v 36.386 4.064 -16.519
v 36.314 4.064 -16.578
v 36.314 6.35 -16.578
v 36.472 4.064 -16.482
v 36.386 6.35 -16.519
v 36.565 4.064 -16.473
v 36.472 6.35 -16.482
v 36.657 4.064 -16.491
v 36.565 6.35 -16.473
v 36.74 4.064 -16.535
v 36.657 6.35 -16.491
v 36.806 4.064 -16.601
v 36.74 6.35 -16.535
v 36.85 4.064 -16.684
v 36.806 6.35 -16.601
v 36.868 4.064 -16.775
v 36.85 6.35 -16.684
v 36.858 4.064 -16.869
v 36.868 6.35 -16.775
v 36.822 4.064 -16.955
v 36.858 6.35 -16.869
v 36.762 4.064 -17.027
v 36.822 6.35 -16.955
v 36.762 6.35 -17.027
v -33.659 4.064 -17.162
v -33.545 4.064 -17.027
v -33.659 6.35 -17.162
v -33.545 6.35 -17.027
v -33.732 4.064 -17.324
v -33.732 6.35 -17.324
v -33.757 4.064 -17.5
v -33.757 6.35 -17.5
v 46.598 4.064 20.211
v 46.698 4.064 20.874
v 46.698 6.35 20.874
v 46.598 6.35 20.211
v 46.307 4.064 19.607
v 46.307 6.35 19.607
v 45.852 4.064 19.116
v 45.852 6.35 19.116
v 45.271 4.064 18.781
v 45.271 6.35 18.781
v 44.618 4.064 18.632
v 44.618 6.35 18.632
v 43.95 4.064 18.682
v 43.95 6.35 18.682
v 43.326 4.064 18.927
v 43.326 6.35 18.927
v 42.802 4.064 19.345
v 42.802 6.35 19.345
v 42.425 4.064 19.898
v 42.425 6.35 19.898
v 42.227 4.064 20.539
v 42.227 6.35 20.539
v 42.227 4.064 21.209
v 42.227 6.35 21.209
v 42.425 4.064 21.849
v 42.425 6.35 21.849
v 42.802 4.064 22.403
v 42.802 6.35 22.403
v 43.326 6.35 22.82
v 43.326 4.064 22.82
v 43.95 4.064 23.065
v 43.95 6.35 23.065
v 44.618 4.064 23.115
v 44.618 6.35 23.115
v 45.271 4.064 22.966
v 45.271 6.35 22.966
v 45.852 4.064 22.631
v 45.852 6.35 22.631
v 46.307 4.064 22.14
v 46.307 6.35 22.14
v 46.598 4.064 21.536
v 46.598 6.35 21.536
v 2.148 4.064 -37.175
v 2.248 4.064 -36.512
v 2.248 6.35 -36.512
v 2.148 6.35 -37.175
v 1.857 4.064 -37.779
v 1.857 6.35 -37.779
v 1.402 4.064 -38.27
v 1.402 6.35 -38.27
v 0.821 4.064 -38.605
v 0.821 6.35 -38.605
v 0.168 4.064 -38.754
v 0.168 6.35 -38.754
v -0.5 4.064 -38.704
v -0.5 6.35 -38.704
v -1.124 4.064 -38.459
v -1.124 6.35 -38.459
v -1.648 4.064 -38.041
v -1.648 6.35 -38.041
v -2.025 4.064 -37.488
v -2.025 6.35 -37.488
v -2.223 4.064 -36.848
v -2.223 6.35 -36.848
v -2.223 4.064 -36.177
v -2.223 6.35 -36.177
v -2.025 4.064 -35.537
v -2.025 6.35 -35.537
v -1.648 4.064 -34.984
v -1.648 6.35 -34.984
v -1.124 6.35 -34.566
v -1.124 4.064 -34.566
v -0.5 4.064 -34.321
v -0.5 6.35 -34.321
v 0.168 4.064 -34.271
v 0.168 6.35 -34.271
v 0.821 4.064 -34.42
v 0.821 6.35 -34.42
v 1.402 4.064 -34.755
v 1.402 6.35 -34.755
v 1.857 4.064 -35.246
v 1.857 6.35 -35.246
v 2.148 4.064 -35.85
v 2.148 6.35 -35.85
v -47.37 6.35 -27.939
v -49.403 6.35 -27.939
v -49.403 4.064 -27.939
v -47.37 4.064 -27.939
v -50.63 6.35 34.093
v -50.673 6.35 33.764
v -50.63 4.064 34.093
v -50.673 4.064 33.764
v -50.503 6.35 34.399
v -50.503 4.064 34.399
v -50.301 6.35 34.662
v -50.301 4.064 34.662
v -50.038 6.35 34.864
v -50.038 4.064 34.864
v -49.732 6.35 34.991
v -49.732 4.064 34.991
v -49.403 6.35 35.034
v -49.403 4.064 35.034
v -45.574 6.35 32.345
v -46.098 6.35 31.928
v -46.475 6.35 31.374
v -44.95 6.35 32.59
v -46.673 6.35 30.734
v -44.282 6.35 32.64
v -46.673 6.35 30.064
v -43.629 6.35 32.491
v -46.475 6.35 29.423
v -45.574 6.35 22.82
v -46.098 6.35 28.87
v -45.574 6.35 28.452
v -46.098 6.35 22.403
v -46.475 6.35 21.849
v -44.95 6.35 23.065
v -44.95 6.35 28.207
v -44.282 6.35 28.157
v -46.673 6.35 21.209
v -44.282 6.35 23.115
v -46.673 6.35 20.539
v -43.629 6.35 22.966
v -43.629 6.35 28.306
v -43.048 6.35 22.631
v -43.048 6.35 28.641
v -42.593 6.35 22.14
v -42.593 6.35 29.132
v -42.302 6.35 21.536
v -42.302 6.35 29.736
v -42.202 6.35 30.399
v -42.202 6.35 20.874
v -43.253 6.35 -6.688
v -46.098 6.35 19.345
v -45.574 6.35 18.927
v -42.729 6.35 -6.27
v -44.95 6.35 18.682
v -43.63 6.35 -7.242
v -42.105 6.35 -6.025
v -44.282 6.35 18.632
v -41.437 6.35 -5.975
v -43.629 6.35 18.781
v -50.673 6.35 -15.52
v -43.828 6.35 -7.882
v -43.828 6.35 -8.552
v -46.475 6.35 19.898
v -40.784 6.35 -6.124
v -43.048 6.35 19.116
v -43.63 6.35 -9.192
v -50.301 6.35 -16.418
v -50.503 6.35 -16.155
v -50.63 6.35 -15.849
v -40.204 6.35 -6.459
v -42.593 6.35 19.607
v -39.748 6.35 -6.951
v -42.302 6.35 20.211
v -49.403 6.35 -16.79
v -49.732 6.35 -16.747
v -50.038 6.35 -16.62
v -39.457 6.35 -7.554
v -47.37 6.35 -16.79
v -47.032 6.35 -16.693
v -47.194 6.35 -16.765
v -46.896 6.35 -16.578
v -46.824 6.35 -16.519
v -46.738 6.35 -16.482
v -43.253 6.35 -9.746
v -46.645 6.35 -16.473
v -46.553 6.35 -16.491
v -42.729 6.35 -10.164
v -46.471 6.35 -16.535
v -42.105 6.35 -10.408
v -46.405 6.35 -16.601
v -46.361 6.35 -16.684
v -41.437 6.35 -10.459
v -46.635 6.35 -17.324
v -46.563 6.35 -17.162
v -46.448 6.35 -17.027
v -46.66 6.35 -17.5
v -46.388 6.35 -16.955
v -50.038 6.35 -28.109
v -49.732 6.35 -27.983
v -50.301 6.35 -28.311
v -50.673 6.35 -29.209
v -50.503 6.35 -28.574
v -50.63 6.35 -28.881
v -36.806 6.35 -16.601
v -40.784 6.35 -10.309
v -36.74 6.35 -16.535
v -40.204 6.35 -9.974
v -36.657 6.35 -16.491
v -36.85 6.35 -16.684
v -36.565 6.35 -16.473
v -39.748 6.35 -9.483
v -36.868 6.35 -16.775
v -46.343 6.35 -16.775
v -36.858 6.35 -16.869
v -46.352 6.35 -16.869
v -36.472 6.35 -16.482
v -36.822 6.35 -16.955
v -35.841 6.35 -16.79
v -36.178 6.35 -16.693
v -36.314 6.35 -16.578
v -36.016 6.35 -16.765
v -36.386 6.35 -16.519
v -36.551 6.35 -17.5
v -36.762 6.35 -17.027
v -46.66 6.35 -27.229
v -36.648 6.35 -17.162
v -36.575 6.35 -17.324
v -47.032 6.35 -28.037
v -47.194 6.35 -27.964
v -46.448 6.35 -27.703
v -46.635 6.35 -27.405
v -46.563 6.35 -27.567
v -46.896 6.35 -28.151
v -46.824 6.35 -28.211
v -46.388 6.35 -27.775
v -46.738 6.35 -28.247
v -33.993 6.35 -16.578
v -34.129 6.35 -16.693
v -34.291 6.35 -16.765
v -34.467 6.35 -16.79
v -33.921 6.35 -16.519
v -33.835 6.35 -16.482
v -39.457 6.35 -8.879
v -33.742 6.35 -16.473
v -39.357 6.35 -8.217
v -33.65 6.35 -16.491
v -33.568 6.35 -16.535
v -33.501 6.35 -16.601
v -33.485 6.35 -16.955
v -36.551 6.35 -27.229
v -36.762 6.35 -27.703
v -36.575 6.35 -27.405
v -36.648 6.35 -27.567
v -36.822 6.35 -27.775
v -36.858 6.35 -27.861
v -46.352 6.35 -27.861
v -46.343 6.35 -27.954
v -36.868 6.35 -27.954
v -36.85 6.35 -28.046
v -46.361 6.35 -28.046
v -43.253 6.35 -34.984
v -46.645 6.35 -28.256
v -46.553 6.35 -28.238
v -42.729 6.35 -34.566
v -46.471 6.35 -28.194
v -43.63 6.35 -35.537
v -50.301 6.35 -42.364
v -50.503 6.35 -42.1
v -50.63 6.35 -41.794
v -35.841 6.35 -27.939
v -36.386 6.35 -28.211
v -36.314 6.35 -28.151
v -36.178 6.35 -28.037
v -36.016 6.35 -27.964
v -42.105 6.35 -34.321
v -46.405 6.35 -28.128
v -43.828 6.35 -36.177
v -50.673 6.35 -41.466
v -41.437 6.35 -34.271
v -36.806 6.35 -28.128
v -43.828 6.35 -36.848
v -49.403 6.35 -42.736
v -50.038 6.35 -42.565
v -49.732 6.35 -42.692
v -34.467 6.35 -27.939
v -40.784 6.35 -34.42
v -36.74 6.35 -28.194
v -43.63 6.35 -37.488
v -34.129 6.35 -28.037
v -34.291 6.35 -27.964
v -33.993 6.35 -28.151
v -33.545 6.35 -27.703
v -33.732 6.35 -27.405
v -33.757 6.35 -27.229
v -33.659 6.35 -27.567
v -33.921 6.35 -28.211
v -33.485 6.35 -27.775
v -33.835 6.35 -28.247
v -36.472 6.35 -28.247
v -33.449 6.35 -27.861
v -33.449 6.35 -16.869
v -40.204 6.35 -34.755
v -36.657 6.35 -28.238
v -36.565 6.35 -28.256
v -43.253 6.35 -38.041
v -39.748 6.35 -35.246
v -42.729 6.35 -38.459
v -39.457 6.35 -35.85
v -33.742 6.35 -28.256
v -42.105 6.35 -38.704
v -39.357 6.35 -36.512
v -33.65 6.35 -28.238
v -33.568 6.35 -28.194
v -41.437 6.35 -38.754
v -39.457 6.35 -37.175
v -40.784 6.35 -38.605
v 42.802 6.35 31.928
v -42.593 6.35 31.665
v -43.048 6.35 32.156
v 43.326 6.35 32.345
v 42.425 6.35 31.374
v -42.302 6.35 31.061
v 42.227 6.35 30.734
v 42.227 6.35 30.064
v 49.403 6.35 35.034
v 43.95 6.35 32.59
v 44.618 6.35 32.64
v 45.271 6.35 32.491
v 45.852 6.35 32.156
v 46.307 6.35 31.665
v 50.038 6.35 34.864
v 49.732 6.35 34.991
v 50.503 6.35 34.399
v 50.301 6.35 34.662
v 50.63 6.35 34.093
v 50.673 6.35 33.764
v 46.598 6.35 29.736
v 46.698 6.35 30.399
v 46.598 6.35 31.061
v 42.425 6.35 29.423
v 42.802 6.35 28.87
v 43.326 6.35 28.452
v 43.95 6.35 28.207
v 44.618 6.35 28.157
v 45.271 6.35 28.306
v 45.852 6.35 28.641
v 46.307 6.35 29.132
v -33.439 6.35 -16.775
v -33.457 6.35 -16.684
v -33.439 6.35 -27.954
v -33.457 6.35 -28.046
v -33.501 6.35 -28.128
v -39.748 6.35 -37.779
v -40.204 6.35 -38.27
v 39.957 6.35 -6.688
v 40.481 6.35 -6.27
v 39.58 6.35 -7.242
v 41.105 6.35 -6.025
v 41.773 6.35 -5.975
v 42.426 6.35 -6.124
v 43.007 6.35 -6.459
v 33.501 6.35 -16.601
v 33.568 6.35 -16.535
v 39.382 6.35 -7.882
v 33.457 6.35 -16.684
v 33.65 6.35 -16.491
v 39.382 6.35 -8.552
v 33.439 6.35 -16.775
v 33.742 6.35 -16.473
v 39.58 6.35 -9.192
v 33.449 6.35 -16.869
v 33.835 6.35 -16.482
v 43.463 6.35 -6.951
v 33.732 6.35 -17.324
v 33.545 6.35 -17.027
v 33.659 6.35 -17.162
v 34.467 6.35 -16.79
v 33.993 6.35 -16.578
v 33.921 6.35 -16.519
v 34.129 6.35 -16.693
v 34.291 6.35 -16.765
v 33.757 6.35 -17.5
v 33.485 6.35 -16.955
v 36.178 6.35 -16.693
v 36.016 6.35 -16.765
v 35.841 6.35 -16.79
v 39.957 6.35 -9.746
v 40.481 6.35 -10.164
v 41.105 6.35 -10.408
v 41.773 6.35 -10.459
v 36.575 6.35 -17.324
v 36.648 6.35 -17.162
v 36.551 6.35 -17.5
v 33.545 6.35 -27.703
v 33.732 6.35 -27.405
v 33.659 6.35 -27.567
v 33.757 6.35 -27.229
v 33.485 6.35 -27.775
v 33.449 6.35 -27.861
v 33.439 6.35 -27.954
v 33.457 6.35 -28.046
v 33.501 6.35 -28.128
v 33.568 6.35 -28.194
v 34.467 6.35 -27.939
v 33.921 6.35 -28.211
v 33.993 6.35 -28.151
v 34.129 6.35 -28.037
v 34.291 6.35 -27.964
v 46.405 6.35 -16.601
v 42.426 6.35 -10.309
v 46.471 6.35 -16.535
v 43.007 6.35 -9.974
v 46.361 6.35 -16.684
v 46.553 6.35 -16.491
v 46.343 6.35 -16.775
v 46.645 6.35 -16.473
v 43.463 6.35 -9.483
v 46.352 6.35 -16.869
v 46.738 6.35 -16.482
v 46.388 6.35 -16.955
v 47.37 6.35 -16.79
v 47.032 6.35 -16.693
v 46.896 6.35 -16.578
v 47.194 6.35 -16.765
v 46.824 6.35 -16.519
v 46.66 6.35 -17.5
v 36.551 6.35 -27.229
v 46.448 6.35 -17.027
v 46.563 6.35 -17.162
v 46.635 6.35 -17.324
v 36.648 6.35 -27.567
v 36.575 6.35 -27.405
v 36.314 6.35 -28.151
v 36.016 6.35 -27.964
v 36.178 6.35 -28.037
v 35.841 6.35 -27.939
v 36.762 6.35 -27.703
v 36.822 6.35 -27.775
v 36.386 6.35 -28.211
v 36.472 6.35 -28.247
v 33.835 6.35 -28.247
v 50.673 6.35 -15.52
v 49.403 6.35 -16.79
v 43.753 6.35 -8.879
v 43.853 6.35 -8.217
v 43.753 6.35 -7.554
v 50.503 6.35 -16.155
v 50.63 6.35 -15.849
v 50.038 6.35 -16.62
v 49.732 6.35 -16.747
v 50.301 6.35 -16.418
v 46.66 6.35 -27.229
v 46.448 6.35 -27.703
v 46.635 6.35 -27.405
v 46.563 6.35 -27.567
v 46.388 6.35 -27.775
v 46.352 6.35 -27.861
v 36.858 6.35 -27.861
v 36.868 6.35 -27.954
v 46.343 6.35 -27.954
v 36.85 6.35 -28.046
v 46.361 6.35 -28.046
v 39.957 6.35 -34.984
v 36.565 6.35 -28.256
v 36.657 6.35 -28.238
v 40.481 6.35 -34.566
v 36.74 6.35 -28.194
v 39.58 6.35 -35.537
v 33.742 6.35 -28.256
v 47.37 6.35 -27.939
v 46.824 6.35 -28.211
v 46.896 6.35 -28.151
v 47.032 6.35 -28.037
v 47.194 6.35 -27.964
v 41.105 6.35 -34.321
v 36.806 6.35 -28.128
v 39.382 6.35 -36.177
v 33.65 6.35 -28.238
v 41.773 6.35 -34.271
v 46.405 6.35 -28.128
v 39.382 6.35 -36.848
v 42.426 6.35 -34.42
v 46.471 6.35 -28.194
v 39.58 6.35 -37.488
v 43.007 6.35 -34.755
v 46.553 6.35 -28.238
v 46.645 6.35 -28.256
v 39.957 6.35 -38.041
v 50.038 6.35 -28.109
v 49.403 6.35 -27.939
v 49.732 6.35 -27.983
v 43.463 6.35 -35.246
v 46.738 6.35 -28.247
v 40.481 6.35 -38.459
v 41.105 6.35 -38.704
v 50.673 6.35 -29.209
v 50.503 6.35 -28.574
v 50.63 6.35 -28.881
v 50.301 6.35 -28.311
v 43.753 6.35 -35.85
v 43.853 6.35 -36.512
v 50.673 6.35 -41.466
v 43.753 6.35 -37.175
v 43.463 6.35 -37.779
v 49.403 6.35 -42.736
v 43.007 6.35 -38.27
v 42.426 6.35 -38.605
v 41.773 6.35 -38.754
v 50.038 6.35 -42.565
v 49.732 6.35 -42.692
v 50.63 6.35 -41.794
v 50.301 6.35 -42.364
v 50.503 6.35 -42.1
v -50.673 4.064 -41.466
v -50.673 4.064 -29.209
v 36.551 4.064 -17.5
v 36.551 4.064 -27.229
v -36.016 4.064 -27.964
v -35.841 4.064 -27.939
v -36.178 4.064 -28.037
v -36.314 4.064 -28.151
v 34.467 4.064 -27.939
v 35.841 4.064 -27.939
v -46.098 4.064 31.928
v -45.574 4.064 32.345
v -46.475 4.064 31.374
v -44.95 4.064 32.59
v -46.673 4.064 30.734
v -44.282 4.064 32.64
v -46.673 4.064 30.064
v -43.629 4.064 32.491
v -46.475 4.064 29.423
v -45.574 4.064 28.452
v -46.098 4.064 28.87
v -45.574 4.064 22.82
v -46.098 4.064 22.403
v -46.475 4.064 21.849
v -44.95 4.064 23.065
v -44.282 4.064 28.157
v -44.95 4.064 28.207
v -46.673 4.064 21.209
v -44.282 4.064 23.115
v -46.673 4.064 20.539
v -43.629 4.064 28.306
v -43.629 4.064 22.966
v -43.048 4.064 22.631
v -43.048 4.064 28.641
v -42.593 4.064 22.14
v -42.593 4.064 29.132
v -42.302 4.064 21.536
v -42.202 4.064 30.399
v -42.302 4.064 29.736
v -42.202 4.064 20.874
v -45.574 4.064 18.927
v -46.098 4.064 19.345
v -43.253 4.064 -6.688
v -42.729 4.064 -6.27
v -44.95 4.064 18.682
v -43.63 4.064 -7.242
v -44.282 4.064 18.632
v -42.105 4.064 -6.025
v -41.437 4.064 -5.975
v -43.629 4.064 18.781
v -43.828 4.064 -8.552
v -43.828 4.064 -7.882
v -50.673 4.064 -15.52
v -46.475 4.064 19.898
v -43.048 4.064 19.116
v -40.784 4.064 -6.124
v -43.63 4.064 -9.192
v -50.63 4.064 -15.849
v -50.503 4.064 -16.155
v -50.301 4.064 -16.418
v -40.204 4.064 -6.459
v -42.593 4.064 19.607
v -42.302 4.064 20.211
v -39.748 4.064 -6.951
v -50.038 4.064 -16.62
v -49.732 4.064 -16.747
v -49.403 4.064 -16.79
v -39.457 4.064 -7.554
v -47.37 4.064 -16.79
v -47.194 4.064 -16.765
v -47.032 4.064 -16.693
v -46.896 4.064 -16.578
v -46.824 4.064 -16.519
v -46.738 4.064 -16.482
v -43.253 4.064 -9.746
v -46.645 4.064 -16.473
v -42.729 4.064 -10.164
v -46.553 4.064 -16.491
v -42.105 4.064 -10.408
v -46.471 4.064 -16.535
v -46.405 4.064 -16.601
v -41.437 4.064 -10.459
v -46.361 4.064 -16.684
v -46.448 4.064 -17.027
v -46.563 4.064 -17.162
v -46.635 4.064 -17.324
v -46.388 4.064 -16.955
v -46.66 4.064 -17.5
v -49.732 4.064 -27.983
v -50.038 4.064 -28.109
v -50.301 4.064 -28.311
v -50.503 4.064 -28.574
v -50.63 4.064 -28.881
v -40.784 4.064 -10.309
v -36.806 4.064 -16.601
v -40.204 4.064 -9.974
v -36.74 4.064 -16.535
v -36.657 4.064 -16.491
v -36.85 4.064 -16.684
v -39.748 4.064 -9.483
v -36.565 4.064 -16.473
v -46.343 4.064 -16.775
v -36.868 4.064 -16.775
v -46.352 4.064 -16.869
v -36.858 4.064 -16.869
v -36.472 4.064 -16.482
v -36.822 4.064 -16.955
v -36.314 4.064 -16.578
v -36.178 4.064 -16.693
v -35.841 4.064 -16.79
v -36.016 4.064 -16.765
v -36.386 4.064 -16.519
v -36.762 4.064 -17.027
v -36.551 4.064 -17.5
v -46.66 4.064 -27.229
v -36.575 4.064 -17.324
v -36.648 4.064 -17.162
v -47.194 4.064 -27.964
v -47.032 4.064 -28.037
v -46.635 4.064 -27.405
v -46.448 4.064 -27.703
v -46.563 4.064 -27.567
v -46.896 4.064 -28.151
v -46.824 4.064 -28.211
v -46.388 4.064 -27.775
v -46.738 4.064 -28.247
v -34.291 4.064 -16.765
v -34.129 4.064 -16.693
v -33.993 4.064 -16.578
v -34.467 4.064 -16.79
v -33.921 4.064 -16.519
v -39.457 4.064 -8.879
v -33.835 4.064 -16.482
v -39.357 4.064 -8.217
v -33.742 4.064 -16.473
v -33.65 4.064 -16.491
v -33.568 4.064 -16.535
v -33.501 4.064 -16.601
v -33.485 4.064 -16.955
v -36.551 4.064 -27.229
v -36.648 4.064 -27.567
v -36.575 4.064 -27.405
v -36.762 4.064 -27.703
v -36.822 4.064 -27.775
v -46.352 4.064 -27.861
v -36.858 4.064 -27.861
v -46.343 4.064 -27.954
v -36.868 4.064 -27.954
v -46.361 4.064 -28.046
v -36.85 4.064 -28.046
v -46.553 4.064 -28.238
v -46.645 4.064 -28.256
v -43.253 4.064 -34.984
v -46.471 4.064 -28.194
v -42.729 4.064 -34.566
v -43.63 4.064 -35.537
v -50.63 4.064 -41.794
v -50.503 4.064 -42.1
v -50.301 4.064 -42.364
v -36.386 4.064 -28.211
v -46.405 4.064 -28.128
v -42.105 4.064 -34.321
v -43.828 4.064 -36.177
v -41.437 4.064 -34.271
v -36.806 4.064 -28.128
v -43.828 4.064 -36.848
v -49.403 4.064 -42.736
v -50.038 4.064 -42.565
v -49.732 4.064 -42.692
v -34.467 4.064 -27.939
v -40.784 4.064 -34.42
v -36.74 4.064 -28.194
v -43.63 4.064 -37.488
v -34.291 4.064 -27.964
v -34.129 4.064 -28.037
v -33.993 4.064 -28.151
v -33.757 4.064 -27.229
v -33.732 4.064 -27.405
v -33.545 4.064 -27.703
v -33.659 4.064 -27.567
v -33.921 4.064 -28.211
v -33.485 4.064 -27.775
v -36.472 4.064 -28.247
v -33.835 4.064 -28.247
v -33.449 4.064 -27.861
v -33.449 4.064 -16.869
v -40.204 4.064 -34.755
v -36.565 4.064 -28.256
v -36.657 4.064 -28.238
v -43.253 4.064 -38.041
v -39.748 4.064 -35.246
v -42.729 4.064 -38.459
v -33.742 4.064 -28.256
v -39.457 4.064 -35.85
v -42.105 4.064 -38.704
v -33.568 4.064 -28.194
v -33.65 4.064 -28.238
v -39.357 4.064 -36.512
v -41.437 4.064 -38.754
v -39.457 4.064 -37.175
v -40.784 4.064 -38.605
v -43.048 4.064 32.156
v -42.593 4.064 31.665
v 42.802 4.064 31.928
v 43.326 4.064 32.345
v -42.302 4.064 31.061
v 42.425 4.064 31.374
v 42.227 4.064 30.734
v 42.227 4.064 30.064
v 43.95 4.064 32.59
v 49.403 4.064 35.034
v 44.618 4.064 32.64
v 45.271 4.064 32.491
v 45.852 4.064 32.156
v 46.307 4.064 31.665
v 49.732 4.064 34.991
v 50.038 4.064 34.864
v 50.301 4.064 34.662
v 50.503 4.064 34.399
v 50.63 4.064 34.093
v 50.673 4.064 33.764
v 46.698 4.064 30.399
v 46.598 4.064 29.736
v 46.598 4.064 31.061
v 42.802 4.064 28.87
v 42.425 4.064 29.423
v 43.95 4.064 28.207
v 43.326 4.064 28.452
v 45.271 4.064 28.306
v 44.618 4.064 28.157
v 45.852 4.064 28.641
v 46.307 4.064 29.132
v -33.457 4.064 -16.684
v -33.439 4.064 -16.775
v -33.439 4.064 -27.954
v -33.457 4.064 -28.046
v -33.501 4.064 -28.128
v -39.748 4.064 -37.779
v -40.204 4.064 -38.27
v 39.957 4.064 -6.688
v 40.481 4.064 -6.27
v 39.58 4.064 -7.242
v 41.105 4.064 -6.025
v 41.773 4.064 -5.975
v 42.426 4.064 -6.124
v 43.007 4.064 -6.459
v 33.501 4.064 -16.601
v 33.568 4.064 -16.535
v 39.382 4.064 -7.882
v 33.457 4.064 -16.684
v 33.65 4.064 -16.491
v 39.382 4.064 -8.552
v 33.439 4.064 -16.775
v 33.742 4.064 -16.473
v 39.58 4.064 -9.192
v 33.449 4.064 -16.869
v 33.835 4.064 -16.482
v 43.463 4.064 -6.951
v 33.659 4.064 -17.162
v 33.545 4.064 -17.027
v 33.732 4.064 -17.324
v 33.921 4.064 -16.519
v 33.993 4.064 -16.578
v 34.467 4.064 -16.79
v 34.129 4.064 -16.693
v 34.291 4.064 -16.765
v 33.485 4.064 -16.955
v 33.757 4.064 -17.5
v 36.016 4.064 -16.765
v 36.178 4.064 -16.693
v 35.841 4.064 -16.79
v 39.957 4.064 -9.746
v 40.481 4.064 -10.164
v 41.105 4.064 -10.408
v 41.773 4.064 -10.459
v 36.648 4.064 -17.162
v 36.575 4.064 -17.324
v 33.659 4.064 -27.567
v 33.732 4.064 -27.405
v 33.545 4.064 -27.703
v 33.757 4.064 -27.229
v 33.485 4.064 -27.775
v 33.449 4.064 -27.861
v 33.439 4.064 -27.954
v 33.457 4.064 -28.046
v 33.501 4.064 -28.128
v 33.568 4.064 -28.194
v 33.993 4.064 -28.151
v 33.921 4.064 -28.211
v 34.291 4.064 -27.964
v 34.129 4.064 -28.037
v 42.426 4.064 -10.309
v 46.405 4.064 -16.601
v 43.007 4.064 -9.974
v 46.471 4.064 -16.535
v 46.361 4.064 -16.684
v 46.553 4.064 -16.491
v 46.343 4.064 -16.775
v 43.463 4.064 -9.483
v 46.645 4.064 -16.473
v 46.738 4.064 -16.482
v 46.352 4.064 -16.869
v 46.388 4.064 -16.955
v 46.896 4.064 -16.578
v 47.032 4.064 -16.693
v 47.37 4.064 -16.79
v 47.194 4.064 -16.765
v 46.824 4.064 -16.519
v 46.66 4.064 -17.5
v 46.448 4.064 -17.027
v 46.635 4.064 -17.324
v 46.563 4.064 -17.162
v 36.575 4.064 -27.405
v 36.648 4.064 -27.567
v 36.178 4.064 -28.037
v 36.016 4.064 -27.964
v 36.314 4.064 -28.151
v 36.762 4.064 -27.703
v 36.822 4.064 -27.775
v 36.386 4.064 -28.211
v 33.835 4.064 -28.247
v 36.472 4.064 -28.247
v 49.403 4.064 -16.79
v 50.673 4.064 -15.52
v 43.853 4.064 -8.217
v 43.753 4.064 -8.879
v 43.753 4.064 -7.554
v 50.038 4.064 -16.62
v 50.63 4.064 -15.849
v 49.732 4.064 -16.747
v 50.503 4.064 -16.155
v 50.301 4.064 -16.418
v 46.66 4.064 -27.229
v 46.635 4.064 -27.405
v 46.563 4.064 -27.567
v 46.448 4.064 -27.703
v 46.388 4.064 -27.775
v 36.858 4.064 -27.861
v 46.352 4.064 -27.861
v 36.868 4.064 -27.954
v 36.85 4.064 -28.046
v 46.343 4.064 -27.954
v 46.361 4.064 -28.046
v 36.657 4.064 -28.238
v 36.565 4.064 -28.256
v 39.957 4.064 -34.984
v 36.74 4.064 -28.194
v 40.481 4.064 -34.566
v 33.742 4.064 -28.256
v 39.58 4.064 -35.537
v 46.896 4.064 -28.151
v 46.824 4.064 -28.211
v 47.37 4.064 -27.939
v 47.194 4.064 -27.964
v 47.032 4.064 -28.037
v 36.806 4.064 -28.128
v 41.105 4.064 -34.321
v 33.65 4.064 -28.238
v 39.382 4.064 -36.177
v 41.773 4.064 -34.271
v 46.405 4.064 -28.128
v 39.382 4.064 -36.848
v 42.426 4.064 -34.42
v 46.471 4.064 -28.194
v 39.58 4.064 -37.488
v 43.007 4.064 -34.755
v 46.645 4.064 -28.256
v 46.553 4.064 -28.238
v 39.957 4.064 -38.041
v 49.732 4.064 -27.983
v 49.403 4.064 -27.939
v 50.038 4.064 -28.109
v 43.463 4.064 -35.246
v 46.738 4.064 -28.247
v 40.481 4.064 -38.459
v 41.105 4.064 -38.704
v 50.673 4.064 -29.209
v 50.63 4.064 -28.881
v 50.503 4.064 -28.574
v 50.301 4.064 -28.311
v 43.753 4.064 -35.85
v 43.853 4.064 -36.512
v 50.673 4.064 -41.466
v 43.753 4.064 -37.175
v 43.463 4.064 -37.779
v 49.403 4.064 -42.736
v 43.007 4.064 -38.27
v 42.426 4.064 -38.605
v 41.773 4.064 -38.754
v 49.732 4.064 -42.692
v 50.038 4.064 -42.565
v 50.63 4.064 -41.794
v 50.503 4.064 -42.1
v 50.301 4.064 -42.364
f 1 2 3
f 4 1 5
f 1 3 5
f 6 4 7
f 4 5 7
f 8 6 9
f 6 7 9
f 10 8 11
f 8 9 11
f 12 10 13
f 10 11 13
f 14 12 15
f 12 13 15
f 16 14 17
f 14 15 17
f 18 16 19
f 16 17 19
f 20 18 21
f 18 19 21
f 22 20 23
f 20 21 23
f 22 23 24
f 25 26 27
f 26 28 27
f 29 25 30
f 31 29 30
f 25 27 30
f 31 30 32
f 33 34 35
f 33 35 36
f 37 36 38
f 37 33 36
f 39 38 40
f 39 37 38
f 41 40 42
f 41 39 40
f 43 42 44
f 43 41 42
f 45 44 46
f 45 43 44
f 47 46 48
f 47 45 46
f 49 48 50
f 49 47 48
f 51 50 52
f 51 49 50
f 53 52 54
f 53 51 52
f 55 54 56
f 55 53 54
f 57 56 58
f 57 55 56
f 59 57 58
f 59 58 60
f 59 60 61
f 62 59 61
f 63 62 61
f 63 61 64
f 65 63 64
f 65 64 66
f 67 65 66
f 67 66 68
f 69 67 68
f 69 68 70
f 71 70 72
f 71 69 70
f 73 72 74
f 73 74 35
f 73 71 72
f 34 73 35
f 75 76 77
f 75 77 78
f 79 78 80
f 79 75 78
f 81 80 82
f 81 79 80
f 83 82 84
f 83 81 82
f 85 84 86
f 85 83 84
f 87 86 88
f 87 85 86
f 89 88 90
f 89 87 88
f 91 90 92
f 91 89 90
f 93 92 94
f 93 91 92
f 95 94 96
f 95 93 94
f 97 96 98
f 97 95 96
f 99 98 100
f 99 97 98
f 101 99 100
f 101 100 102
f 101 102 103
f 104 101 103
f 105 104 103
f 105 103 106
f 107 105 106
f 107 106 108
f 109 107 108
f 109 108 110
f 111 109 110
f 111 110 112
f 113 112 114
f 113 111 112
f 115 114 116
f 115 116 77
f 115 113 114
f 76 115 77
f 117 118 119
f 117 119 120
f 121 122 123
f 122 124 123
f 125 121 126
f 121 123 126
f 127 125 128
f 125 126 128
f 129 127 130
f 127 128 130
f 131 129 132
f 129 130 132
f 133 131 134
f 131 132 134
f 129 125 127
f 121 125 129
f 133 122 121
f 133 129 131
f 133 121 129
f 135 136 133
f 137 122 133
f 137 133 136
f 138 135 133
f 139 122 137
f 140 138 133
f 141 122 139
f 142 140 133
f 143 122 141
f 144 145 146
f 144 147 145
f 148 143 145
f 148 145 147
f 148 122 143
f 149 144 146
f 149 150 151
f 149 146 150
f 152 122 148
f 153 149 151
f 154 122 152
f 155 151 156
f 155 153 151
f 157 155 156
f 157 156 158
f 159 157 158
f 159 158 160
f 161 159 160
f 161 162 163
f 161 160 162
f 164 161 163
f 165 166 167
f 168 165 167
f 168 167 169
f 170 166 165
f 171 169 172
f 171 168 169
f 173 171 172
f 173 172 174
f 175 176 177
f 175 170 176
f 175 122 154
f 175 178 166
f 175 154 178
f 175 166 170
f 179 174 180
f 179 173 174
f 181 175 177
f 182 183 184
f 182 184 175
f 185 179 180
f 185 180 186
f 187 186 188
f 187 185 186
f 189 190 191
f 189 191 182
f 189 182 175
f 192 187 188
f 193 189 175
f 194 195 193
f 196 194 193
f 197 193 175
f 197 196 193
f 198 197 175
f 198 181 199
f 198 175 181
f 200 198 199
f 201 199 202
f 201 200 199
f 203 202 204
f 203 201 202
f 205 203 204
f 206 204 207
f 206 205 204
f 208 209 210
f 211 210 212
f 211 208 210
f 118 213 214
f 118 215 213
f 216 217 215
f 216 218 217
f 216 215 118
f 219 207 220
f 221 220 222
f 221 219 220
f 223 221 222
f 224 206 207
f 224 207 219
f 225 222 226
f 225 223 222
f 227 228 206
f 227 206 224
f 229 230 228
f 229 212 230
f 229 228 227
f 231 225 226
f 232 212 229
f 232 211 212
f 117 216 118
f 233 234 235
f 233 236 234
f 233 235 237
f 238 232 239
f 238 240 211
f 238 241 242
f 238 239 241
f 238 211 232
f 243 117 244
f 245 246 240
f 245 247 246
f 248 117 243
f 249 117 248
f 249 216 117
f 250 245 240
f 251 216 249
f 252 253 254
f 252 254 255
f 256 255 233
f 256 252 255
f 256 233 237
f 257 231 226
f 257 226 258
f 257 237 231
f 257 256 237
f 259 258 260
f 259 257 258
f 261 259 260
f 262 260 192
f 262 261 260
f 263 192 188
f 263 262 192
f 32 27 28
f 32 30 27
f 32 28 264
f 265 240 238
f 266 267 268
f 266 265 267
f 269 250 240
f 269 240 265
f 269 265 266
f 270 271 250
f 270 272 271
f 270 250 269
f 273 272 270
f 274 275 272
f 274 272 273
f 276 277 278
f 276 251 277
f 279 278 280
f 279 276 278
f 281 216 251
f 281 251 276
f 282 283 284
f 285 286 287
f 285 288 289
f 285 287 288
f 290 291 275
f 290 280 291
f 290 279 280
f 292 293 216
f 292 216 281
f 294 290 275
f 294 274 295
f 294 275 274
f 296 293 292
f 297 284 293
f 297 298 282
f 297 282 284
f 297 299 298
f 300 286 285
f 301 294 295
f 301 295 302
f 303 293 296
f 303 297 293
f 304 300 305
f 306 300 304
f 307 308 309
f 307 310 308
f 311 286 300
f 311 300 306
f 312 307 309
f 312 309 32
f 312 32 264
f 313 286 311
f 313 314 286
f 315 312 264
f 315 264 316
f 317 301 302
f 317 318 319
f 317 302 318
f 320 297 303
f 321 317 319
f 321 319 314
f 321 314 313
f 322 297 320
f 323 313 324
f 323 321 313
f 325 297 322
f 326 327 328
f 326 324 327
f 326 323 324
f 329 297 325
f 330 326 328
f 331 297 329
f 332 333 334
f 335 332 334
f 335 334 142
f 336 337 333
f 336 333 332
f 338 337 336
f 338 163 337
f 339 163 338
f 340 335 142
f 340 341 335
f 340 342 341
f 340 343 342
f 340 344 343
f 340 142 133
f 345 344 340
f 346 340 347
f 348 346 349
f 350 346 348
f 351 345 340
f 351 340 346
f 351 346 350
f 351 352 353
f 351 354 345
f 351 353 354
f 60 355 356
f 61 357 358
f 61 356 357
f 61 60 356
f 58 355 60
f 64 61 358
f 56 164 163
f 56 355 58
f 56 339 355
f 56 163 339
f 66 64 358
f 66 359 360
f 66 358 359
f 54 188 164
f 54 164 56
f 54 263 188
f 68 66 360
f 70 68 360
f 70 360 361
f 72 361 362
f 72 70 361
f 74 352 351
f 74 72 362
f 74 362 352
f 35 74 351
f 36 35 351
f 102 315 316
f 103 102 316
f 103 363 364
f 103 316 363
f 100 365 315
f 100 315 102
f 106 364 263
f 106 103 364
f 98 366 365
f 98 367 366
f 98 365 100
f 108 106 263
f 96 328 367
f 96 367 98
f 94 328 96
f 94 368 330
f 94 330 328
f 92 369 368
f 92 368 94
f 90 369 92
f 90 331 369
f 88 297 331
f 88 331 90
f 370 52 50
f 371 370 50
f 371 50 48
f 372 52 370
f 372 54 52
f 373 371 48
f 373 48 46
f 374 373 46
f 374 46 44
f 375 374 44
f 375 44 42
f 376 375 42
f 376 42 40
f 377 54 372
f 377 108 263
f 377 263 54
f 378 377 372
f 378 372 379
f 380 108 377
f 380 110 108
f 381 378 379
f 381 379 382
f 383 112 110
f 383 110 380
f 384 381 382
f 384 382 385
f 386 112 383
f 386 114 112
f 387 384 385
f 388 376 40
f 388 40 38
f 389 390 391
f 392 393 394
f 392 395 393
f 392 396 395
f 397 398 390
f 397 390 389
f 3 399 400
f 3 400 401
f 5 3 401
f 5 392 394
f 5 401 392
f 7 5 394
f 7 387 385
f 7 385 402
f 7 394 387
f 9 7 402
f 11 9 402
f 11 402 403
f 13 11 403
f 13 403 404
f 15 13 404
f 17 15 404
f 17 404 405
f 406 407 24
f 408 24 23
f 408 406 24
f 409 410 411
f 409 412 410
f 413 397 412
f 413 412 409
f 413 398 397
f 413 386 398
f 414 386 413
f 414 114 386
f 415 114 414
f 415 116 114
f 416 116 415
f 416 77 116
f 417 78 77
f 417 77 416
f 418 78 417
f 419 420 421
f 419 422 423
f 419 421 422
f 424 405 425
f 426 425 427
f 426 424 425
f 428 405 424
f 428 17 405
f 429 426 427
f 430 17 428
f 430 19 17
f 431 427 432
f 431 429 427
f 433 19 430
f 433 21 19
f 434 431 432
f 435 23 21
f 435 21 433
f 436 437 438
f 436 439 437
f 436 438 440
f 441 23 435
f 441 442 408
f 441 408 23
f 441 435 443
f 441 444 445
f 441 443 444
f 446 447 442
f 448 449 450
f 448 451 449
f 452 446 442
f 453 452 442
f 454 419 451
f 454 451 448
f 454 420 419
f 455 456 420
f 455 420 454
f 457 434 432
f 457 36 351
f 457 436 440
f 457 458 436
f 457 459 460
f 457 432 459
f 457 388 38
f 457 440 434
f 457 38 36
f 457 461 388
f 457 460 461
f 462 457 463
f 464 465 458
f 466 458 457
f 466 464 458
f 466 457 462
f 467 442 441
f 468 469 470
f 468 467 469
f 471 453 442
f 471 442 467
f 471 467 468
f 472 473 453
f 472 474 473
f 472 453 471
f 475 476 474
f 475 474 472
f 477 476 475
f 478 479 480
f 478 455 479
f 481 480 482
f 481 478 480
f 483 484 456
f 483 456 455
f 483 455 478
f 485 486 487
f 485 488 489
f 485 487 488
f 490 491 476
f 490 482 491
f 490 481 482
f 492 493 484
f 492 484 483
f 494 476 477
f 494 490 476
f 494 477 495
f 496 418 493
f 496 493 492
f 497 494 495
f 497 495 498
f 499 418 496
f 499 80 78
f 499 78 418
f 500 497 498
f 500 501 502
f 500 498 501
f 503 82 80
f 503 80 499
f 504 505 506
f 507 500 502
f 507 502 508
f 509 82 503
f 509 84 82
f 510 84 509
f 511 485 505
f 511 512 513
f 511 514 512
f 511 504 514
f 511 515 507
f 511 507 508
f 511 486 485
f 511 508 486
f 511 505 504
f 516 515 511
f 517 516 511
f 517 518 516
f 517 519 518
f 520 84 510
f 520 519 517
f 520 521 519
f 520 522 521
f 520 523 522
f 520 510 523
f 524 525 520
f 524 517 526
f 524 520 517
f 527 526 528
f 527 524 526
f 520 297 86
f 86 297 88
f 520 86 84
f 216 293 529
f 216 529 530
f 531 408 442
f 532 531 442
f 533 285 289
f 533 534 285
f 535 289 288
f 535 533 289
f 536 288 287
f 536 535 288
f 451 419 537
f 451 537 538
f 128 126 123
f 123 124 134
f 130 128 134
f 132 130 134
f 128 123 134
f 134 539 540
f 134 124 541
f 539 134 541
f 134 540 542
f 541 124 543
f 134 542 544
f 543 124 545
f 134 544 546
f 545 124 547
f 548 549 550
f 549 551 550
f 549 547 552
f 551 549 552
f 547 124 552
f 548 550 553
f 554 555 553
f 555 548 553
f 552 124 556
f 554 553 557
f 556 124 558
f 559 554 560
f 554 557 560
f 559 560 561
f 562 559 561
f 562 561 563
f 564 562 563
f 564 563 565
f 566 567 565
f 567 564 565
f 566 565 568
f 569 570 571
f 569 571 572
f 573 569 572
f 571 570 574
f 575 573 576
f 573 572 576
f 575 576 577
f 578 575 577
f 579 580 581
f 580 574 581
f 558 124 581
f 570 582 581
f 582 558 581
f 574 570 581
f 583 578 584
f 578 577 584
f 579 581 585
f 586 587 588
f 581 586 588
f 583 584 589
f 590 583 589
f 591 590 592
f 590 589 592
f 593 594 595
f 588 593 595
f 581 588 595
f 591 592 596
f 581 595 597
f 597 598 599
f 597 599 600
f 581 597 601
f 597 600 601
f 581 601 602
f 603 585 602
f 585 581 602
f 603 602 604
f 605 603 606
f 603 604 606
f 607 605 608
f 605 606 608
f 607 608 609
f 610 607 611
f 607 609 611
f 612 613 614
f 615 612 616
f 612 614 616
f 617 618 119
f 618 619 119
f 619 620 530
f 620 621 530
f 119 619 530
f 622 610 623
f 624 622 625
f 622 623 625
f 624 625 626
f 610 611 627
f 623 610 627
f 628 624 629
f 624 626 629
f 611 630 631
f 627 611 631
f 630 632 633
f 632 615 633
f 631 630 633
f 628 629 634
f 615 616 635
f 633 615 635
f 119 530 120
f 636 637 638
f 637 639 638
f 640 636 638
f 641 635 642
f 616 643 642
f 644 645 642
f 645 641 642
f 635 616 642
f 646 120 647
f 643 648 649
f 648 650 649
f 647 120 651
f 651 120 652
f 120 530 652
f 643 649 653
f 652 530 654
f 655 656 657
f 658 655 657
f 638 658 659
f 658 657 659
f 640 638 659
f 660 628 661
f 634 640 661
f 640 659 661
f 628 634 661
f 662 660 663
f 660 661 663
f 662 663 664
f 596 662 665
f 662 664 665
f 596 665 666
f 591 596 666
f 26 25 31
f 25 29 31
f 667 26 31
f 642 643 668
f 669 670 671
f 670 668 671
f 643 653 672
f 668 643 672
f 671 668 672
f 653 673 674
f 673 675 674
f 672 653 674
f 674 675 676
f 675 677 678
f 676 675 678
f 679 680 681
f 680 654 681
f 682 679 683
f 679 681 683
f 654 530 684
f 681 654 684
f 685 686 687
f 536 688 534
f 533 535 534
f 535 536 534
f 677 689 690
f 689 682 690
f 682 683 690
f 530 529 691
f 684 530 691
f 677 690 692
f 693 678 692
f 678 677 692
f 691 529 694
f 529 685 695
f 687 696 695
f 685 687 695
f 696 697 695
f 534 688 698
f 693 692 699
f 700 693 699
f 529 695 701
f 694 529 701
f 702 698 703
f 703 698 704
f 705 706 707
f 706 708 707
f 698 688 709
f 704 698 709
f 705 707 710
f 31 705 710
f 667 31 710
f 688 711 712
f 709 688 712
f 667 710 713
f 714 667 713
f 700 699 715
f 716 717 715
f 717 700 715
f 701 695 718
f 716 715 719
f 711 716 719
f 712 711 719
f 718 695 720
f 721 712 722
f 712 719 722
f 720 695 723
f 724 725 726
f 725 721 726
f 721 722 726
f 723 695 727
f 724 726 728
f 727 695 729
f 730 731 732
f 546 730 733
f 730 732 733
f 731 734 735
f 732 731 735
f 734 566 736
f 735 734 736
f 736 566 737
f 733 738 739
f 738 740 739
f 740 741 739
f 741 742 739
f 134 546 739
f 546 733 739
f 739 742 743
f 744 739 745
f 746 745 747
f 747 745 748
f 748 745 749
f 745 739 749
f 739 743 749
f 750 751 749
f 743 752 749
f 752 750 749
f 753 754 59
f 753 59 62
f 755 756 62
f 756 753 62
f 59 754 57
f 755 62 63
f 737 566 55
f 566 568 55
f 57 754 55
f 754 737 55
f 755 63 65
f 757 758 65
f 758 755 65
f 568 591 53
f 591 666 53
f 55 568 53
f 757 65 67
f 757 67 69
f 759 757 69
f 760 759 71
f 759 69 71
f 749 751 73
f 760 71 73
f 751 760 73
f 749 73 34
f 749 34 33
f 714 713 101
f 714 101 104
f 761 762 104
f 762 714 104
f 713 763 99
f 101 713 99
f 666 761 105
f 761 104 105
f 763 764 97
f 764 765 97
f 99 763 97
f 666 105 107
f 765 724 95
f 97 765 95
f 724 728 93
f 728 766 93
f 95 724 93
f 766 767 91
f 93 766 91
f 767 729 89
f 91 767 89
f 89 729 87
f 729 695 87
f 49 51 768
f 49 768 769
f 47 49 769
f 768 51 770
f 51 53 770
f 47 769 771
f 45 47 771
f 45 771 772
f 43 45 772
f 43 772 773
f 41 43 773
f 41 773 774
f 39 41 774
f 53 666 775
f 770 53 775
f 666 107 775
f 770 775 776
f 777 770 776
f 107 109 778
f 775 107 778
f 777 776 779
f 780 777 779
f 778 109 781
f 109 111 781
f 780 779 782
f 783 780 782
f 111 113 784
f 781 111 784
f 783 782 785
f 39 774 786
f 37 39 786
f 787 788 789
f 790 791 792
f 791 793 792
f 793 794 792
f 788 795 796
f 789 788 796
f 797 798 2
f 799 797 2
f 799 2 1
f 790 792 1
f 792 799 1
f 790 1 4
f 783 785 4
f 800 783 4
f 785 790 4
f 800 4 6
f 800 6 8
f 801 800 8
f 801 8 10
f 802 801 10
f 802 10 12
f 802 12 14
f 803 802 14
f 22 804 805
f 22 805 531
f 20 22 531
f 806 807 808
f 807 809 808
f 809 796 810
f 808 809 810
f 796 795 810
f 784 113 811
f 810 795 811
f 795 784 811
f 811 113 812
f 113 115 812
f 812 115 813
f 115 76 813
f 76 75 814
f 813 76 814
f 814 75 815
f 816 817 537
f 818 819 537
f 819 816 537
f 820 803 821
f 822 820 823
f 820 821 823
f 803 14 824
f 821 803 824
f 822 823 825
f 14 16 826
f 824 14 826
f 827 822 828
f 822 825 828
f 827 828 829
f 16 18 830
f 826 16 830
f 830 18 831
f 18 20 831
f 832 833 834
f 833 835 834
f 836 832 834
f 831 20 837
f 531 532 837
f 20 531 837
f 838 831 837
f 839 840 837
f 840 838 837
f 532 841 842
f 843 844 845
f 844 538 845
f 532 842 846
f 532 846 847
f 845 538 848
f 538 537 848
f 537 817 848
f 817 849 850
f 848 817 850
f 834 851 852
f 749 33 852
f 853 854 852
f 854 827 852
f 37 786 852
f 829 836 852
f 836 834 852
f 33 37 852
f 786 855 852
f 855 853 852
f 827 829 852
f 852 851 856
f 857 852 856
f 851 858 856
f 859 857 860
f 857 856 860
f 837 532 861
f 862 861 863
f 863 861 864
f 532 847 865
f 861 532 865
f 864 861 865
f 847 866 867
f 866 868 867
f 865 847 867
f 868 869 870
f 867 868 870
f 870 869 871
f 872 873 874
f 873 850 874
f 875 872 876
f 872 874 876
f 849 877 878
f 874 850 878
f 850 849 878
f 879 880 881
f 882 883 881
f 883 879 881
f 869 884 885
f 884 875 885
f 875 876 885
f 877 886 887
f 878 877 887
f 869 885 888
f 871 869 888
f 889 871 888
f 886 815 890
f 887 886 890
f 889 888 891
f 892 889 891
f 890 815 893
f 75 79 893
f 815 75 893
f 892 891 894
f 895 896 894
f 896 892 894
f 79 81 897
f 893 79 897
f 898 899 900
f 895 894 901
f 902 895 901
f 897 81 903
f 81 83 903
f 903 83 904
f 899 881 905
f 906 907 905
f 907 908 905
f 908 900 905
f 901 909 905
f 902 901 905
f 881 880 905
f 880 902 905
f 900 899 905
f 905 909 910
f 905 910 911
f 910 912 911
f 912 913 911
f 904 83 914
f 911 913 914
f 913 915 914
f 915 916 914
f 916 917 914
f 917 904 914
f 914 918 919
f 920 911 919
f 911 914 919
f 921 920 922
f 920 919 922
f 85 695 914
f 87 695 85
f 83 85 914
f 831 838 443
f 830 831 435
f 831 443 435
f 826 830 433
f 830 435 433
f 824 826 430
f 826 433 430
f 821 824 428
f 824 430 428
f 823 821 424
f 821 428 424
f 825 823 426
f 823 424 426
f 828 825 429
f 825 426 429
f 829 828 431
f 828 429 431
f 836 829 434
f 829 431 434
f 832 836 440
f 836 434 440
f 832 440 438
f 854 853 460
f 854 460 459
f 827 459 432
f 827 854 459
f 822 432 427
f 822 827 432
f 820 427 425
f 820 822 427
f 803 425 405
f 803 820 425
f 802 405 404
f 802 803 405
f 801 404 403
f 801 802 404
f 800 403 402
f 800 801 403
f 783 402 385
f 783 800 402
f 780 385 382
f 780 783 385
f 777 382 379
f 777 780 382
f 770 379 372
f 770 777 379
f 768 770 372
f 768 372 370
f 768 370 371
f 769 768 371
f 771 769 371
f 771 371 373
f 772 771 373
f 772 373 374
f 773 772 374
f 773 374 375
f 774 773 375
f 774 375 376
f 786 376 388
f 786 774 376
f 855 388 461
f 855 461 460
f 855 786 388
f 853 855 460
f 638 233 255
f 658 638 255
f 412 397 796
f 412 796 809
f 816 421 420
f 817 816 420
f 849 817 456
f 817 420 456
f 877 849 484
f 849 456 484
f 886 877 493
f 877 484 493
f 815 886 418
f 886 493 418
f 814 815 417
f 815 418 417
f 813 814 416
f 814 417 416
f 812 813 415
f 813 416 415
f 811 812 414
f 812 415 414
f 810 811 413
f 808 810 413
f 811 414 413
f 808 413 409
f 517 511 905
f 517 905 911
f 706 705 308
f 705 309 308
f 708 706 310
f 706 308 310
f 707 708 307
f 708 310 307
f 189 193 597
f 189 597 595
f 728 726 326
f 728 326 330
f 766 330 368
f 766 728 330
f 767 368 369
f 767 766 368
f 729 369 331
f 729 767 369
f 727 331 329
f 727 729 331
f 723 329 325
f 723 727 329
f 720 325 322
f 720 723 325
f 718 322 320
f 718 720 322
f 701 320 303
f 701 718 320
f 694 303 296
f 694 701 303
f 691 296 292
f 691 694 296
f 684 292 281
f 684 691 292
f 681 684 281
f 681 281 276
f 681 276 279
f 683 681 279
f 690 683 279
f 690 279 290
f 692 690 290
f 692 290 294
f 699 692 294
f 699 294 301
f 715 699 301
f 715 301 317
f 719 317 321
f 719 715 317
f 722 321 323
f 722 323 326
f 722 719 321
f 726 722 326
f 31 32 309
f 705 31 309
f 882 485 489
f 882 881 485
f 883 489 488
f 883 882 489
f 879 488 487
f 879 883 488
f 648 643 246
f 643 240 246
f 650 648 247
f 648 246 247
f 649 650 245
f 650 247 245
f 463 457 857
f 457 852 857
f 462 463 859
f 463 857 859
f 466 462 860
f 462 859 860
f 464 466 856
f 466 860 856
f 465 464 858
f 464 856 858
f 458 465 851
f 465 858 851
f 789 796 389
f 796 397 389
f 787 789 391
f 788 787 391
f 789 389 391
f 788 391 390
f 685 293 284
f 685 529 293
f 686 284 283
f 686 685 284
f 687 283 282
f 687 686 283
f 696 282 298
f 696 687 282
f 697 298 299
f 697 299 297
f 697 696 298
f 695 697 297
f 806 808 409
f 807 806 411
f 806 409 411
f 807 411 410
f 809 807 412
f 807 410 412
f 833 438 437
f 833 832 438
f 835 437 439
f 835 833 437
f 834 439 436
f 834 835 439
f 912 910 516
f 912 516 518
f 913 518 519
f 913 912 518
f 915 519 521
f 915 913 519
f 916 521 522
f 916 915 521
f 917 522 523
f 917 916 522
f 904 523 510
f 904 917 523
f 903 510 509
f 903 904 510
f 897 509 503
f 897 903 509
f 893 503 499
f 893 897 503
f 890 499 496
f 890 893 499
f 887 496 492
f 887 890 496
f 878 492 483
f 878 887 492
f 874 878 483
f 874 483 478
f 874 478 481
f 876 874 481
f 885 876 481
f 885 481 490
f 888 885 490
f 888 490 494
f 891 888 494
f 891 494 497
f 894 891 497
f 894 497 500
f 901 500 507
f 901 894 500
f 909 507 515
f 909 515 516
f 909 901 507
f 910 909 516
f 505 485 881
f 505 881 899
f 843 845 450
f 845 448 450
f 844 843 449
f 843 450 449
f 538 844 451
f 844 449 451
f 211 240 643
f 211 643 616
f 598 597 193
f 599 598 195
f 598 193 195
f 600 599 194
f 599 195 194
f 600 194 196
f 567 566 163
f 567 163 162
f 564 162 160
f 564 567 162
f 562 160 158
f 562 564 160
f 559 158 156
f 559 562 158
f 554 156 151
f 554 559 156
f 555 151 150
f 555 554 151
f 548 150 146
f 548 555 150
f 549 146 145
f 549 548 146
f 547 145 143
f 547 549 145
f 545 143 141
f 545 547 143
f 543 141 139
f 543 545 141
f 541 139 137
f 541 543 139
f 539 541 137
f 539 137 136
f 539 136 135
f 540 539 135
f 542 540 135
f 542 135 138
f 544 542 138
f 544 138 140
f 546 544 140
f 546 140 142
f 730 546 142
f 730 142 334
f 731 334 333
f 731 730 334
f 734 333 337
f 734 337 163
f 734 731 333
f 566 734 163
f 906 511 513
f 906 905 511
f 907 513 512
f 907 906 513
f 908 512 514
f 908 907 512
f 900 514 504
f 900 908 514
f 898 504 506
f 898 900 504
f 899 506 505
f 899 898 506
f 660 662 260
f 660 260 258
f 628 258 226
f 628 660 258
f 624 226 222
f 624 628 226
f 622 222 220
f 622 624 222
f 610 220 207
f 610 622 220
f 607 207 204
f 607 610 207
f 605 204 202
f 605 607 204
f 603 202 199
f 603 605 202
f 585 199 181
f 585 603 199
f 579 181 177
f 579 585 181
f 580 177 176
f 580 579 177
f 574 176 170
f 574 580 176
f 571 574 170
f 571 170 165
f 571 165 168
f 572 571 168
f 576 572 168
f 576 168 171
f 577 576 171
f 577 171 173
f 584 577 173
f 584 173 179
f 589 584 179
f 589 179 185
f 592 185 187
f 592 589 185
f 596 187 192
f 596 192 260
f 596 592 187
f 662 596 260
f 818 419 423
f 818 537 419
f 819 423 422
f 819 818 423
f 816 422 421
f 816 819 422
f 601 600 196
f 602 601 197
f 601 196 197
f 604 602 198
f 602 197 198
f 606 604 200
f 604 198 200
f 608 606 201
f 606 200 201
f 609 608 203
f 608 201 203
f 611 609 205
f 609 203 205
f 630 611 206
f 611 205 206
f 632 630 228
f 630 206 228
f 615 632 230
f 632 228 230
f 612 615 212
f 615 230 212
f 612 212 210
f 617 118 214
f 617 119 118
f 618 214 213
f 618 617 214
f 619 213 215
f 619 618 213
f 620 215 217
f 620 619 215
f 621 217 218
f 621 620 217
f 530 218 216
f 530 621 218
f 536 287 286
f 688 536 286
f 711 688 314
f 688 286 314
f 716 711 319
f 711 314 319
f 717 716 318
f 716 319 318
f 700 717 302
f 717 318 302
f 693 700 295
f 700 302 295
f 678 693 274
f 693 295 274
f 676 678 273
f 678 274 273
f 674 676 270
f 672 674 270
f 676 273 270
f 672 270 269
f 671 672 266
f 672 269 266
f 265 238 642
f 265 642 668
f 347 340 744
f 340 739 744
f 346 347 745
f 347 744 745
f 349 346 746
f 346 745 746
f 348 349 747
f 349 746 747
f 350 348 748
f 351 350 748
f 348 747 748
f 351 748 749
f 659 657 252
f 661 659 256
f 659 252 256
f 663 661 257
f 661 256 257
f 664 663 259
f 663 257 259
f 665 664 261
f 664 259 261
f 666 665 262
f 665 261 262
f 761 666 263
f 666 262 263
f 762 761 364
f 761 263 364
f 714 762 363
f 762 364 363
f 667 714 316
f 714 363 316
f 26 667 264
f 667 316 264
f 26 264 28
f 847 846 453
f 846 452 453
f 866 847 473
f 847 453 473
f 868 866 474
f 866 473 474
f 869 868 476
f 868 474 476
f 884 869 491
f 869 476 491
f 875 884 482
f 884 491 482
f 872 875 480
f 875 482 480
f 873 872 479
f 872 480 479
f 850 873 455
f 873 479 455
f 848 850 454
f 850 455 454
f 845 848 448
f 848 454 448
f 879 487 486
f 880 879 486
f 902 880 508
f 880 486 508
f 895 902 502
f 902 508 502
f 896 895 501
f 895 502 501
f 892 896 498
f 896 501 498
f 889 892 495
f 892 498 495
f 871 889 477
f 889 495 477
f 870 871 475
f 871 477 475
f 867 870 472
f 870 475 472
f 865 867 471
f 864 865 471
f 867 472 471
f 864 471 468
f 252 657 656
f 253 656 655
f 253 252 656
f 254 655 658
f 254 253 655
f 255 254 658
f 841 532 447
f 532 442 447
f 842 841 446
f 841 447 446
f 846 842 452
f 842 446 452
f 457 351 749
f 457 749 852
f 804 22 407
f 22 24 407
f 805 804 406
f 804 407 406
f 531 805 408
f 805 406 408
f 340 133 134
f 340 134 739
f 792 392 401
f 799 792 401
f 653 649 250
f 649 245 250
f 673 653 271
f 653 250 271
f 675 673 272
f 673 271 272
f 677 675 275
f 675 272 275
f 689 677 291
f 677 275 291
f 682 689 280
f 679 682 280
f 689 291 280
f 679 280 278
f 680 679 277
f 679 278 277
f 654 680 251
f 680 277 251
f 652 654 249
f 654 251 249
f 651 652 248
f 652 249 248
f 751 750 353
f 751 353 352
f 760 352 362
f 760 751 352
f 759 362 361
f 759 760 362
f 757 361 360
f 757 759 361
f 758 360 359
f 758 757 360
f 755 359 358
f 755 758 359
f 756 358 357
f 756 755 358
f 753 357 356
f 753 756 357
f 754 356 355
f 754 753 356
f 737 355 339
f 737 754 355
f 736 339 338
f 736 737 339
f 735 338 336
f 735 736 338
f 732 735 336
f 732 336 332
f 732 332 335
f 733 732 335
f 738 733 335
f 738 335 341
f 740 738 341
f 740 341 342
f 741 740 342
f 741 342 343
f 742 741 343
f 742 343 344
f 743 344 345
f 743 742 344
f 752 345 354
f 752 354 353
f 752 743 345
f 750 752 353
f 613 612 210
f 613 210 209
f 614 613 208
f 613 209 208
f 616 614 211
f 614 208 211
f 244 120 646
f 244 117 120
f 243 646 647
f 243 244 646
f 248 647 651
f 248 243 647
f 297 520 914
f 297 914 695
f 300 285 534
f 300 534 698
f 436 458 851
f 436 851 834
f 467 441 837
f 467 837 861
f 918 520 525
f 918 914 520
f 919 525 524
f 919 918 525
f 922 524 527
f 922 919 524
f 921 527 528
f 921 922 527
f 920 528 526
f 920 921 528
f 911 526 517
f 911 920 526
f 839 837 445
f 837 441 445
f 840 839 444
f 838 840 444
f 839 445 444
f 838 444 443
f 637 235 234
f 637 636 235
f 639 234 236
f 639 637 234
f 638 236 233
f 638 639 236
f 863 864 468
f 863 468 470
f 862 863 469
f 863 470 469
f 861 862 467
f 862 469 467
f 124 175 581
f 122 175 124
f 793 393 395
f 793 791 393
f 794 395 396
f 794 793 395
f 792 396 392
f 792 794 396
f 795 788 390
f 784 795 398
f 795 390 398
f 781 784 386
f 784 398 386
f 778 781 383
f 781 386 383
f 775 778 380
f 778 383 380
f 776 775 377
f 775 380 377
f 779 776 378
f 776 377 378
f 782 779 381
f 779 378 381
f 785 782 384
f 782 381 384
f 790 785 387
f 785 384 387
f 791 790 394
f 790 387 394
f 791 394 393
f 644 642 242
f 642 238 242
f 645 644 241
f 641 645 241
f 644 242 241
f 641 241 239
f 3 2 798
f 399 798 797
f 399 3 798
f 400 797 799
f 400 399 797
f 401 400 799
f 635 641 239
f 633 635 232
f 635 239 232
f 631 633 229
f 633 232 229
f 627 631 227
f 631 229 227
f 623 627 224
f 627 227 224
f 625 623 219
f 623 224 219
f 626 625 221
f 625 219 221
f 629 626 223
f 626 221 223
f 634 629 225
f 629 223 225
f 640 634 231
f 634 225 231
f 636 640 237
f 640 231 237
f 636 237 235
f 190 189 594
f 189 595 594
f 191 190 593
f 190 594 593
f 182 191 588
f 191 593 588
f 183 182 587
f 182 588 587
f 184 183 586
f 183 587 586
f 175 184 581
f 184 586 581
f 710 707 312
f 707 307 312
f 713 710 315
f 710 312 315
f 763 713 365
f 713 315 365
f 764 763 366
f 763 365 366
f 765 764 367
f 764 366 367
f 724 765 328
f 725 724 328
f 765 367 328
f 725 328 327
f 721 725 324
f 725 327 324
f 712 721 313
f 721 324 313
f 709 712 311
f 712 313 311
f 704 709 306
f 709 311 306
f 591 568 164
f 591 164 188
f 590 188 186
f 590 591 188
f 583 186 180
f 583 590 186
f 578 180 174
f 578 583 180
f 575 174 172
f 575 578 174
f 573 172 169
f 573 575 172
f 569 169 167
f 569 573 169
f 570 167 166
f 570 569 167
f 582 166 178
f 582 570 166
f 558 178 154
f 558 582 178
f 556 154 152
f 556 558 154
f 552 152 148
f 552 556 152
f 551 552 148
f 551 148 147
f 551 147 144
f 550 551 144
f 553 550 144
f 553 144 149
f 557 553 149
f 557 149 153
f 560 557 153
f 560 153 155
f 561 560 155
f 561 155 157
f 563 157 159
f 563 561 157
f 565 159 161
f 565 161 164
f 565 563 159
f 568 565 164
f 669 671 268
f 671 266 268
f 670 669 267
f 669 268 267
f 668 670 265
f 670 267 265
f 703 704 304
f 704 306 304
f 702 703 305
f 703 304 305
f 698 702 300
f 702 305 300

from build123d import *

# Parameters (mm, degrees)
STOCK_BEE_ZERKER_START                     = 4.064
STOCK_BEE_ZERKER_2_0_MULTIBODY_1_OUTLINE_R = 2.2479
STOCK_BEE_ZERKER_2_0_MULTIBODY_1_OUTLINE_W = 2.54
STOCK_BEE_ZERKER_2_0_MULTIBODY_1_OUTLINE_H = 10.89526775
STOCK_BEE_ZERKER_2_0_MULTIBODY_1_DEPTH     = 2.286
SKETCH1_W                                  = 2.794
SKETCH1_H                                  = 11.14926775
SKETCH1_W_2                                = 2.54
SKETCH1_H_2                                = 10.89526775
CUT_EXTRUDE1_DEPTH                         = 67.506087708
SKETCH2_R                                  = 0.3175
CUT_EXTRUDE2_DEPTH                         = 67.327231853
FILLET1_R                                  = 0.635
FILLET2_R                                  = 1.27


# Read off the part's stored shape, not the designer's step: Stock-Bee-zerker 2.0 Multibody-1
with BuildPart() as part:
    # Stock-Bee-zerker 2.0 Multibody-1 outline → Stock-Bee-zerker 2.0 Multibody-1 (new body)
    with BuildSketch(Plane(origin=(0, 0, 0), x_dir=(1, 0, 0), z_dir=(0, 1, 0)).offset(STOCK_BEE_ZERKER_START)):
        Polygon((-50.8, 16.917066125), (-50.8, -35.16122), (50.8, -35.16122), (50.8, 16.917066125), (46.7868, 16.917066125), (46.7868, 27.812333875), (50.8, 27.812333875), (50.8, 42.8625), (-50.8, 42.8625), (-50.8, 27.812333875), (-46.7868, 27.812333875), (-46.7868, 16.917066125), align=None)
        with Locations((-44.45, -30.39872)):
            Circle(STOCK_BEE_ZERKER_2_0_MULTIBODY_1_OUTLINE_R, mode=Mode.SUBTRACT)
        with Locations((-44.45, -20.87372)):
            Circle(STOCK_BEE_ZERKER_2_0_MULTIBODY_1_OUTLINE_R, mode=Mode.SUBTRACT)
        with Locations((44.45, -30.39872)):
            Circle(STOCK_BEE_ZERKER_2_0_MULTIBODY_1_OUTLINE_R, mode=Mode.SUBTRACT)
        with Locations((44.45, -20.87372)):
            Circle(STOCK_BEE_ZERKER_2_0_MULTIBODY_1_OUTLINE_R, mode=Mode.SUBTRACT)
        with Locations((-41.6052, 8.2169)):
            Circle(STOCK_BEE_ZERKER_2_0_MULTIBODY_1_OUTLINE_R, mode=Mode.SUBTRACT)
        with Locations((-35.1536, 22.3647)):
            Rectangle(STOCK_BEE_ZERKER_2_0_MULTIBODY_1_OUTLINE_W, STOCK_BEE_ZERKER_2_0_MULTIBODY_1_OUTLINE_H, mode=Mode.SUBTRACT)
        with Locations((-41.6052, 36.5125)):
            Circle(STOCK_BEE_ZERKER_2_0_MULTIBODY_1_OUTLINE_R, mode=Mode.SUBTRACT)
        with Locations((0, 36.5125)):
            Circle(STOCK_BEE_ZERKER_2_0_MULTIBODY_1_OUTLINE_R, mode=Mode.SUBTRACT)
        with Locations((41.6052, 8.2169)):
            Circle(STOCK_BEE_ZERKER_2_0_MULTIBODY_1_OUTLINE_R, mode=Mode.SUBTRACT)
        with Locations((35.1536, 22.3647)):
            Rectangle(STOCK_BEE_ZERKER_2_0_MULTIBODY_1_OUTLINE_W, STOCK_BEE_ZERKER_2_0_MULTIBODY_1_OUTLINE_H, mode=Mode.SUBTRACT)
        with Locations((41.6052, 36.5125)):
            Circle(STOCK_BEE_ZERKER_2_0_MULTIBODY_1_OUTLINE_R, mode=Mode.SUBTRACT)
    extrude(amount=STOCK_BEE_ZERKER_2_0_MULTIBODY_1_DEPTH)

    # Sketch1 → Cut-Extrude1 (cut, through all)
    # profile 1 of 3: a face of its own
    with BuildSketch(Plane(origin=(0, 6.35, 0), x_dir=(1, 0, 0), z_dir=(0, 1, 0))):
        Polygon((-46.7868, 16.917066125), (-50.8, 16.917066125), (-50.8, -35.16122), (50.8, -35.16122), (50.8, 16.917066125), (46.7868, 16.917066125), (46.7868, 27.812333875), (50.8, 27.812333875), (50.8, 42.8625), (-50.8, 42.8625), (-50.8, 27.812333875), (-46.7868, 27.812333875), align=None)
        Polygon((-46.6598, 16.790066125), (-50.673, 16.790066125), (-50.673, -35.03422), (50.673, -35.03422), (50.673, 16.790066125), (46.6598, 16.790066125), (46.6598, 27.939333875), (50.673, 27.939333875), (50.673, 42.7355), (-50.673, 42.7355), (-50.673, 27.939333875), (-46.6598, 27.939333875), align=None, mode=Mode.SUBTRACT)
    # profile 2 of 3: a face of its own
    with BuildSketch(Plane(origin=(0, 6.35, 0), x_dir=(1, 0, 0), z_dir=(0, 1, 0))):
        with Locations((-35.1536, 22.3647)):
            Rectangle(SKETCH1_W, SKETCH1_H)
        with Locations((-35.1536, 22.3647)):
            Rectangle(SKETCH1_W_2, SKETCH1_H_2, mode=Mode.SUBTRACT)
    # profile 3 of 3: a face of its own
    with BuildSketch(Plane(origin=(0, 6.35, 0), x_dir=(1, 0, 0), z_dir=(0, 1, 0))):
        with Locations((35.1536, 22.3647)):
            Rectangle(SKETCH1_W, SKETCH1_H)
        with Locations((35.1536, 22.3647)):
            Rectangle(SKETCH1_W_2, SKETCH1_H_2, mode=Mode.SUBTRACT)
    extrude(amount=-CUT_EXTRUDE1_DEPTH, mode=Mode.SUBTRACT)

    # Sketch2 → Cut-Extrude2 (cut, through all)
    with BuildSketch(Plane(origin=(0, 6.35, 0), x_dir=(1, 0, 0), z_dir=(0, 1, 0))):
        with Locations((-46.6598, 27.939333875)):
            Circle(SKETCH2_R)
        with Locations((-46.6598, 16.790066125)):
            Circle(SKETCH2_R)
        with Locations((-36.5506, 16.790066125)):
            Circle(SKETCH2_R)
        with Locations((-33.7566, 16.790066125)):
            Circle(SKETCH2_R)
        with Locations((-33.7566, 27.939333875)):
            Circle(SKETCH2_R)
        with Locations((-36.5506, 27.939333875)):
            Circle(SKETCH2_R)
        with Locations((33.7566, 27.939333875)):
            Circle(SKETCH2_R)
        with Locations((36.5506, 27.939333875)):
            Circle(SKETCH2_R)
        with Locations((33.7566, 16.790066125)):
            Circle(SKETCH2_R)
        with Locations((36.5506, 16.790066125)):
            Circle(SKETCH2_R)
        with Locations((46.6598, 16.790066125)):
            Circle(SKETCH2_R)
        with Locations((46.6598, 27.939333875)):
            Circle(SKETCH2_R)
    extrude(amount=-CUT_EXTRUDE2_DEPTH, mode=Mode.SUBTRACT)

    # Fillet1
    fillet1_edges = [part.edges().sort_by_distance(p)[0] for p in [
        (33.7566, 5.207, -17.107566125),
        (33.7566, 5.207, -27.621833875),
        (36.2331, 5.207, -16.790066125),
        (36.5506, 5.207, -27.621833875),
        (-36.5506, 5.207, -17.107566125),
        (-36.5506, 5.207, -27.621833875),
        (-34.0741, 5.207, -16.790066125),
        (-33.7566, 5.207, -27.621833875),
        (-46.6598, 5.207, -27.621833875),
        (-46.6598, 5.207, -17.107566125),
        (46.9773, 5.207, -27.939333875),
        (46.6598, 5.207, -17.107566125),
        (-36.2331, 5.207, -27.939333875),
        (34.0741, 5.207, -27.939333875),
        (36.2331, 5.207, -27.939333875),
        (34.0741, 5.207, -16.790066125),
        (-34.0741, 5.207, -27.939333875),
        (-33.7566, 5.207, -17.107566125),
        (-36.2331, 5.207, -16.790066125),
        (-46.9773, 5.207, -16.790066125),
        (36.5506, 5.207, -17.107566125),
        (46.9773, 5.207, -16.790066125),
        (46.6598, 5.207, -27.621833875),
        (-46.9773, 5.207, -27.939333875),
    ]]
    fillet(fillet1_edges, radius=FILLET1_R)

    # Fillet2
    fillet2_edges = [part.edges().sort_by_distance(p)[0] for p in [
        (-50.673, 5.207, -16.790066125),
        (-50.673, 5.207, 35.03422),
        (50.673, 5.207, 35.03422),
        (50.673, 5.207, -16.790066125),
        (50.673, 5.207, -27.939333875),
        (50.673, 5.207, -42.7355),
        (-50.673, 5.207, -42.7355),
        (-50.673, 5.207, -27.939333875),
    ]]
    fillet(fillet2_edges, radius=FILLET2_R)


solid = part.part
